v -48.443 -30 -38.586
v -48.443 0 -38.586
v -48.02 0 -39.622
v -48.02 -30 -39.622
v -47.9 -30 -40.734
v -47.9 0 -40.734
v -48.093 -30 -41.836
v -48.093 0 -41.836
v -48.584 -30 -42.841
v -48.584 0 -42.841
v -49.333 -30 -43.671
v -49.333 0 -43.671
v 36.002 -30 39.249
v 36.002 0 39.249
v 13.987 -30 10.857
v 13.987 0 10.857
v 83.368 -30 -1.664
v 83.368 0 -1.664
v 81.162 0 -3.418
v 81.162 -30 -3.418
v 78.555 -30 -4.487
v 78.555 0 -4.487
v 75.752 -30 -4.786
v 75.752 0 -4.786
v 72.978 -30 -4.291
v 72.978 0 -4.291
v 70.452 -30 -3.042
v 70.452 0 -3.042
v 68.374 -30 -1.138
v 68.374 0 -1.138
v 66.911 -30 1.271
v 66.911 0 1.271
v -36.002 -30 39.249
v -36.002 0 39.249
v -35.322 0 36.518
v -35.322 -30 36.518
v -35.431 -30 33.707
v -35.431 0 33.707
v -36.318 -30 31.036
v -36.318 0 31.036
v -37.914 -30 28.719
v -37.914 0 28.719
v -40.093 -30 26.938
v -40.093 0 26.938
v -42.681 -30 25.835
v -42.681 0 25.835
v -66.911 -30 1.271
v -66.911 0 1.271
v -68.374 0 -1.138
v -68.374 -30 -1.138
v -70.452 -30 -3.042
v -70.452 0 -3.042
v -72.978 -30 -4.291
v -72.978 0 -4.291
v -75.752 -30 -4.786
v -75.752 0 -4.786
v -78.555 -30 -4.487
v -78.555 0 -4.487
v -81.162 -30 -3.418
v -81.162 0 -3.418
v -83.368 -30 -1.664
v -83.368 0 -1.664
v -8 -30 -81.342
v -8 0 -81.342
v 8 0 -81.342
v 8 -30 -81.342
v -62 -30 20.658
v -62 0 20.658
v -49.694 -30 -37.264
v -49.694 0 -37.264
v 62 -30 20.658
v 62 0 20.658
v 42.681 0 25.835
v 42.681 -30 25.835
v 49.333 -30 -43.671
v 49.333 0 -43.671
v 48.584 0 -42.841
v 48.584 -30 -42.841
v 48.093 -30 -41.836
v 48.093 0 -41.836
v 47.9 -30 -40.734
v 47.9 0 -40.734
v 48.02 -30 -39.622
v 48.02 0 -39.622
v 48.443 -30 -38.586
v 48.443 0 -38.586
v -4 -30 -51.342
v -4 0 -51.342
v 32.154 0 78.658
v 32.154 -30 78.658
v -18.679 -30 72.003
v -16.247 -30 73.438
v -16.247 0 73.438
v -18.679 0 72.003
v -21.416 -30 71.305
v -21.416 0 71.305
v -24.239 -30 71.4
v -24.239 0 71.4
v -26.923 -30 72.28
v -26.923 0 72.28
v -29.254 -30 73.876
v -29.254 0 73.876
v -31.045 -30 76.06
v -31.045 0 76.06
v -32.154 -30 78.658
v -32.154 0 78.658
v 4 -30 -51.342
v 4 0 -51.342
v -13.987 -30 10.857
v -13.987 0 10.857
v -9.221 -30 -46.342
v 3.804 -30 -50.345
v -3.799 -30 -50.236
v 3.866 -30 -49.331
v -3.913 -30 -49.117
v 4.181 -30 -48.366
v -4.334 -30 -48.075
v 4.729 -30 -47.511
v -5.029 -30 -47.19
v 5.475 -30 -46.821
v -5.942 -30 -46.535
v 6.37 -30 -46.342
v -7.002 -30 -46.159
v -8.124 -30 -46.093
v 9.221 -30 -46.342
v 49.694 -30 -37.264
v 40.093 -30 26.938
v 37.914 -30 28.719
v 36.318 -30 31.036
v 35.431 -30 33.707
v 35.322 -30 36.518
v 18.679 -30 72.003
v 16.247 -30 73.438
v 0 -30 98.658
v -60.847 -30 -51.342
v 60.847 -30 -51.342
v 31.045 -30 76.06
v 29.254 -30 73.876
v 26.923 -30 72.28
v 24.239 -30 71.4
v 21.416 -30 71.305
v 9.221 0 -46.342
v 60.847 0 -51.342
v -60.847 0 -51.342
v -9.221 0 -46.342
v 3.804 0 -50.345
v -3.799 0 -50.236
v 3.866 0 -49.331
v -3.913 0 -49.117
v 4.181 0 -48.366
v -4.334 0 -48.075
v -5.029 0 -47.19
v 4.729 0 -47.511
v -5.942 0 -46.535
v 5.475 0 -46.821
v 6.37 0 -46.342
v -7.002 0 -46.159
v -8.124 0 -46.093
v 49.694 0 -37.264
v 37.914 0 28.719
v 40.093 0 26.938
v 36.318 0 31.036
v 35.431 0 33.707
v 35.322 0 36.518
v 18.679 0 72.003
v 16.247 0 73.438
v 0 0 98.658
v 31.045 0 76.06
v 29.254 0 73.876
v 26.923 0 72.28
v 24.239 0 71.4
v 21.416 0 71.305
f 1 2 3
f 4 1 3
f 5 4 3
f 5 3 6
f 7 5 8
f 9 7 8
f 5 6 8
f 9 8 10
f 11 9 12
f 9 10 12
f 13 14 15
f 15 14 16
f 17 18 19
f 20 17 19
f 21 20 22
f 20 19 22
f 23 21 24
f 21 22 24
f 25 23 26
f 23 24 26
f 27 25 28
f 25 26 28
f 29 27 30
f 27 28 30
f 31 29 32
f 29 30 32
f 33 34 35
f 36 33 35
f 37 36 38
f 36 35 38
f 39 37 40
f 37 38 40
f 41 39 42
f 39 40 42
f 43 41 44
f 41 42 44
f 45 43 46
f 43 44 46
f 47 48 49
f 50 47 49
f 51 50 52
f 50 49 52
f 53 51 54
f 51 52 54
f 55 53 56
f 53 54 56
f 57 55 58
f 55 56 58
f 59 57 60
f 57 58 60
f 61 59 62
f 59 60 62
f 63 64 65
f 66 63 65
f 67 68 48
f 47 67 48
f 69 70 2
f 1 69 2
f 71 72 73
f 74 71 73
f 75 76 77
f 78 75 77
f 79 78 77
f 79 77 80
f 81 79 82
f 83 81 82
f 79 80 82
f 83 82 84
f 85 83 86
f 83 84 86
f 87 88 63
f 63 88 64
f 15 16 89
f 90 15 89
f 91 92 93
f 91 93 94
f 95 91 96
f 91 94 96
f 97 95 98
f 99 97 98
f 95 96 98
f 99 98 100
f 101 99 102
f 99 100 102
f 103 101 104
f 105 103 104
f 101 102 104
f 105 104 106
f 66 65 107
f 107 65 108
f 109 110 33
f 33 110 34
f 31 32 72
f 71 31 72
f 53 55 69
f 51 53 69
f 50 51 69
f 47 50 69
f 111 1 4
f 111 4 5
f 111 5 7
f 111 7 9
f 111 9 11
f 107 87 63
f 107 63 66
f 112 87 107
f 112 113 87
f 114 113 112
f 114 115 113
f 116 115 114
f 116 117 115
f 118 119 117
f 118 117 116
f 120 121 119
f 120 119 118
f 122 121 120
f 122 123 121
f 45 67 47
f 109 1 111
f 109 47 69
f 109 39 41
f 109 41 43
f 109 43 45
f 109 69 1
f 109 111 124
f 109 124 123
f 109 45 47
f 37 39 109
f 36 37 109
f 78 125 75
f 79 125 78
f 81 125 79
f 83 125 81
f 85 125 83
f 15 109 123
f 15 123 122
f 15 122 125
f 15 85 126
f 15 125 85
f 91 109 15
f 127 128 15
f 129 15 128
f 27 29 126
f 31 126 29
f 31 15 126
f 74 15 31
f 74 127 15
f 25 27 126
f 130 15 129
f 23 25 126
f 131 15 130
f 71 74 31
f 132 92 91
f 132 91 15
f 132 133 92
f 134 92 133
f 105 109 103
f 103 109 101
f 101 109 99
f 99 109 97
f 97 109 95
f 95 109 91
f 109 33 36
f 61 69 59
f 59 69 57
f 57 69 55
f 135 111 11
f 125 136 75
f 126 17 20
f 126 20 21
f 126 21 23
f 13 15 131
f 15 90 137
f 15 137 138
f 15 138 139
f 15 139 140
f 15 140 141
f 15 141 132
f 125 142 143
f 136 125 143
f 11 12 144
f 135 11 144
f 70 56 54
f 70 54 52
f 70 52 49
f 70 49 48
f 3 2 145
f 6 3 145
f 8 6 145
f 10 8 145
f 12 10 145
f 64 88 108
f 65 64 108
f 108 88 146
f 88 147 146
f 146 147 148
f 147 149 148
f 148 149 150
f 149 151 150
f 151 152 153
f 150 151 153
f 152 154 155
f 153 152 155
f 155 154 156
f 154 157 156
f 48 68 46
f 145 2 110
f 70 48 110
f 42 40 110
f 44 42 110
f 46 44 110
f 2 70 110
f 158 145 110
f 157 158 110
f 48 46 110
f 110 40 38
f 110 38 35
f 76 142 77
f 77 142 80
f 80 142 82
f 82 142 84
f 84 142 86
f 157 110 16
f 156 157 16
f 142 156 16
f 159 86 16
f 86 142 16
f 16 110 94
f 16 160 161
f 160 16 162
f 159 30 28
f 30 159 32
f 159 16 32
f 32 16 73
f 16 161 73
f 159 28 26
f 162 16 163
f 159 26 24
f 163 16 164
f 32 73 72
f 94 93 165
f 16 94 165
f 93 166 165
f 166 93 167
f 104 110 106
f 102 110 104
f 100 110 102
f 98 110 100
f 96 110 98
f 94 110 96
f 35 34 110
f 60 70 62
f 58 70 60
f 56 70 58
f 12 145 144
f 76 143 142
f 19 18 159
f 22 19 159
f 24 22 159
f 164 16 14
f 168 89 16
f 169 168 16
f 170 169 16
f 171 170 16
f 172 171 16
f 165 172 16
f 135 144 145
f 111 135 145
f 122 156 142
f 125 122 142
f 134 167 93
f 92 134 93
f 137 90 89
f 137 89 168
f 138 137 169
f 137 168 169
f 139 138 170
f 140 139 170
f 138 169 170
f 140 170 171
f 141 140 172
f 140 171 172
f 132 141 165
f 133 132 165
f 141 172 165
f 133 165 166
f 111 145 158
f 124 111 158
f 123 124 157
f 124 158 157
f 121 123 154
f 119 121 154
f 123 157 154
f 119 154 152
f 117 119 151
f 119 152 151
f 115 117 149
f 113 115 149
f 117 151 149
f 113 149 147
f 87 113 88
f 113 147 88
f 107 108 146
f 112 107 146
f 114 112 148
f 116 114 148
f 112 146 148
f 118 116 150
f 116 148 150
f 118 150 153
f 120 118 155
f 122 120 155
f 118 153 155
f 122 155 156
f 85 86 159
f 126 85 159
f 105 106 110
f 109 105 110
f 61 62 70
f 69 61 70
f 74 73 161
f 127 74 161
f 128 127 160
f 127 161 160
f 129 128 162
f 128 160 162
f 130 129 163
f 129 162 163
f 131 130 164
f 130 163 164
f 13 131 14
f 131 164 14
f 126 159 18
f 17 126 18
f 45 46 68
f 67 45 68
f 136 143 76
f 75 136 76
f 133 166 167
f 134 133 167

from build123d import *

# Parameters (mm, degrees)
F1_DEPTH = 30


with BuildPart() as f1:
    # F0 (on Front) → F1 (new body)
    with BuildSketch(Plane.XZ):
        with BuildLine():
            Line((16.246856, 73.438403), (0, 98.65823))
            Line((0, 98.65823), (0, -51.34177))
            Line((0, -51.34177), (4, -51.34177))
            ThreePointArc((4, -51.34177), (4.181132, -48.365772), (6.370376, -46.34177))
            ThreePointArc((6.370376, -46.34177), (7.795537, -46.079272), (9.220697, -46.34177))
            Line((9.220697, -46.34177), (60.847245, -51.34177))
            Line((60.847245, -51.34177), (49.33347, -43.671459))
            ThreePointArc((49.33347, -43.671459), (47.957966, -41.291777), (48.44287, -38.58627))
            ThreePointArc((48.44287, -38.58627), (48.992071, -37.85299), (49.69371, -37.263903))
            Line((49.69371, -37.263903), (83.367956, -1.664075))
            ThreePointArc((83.367956, -1.664075), (74.347655, -4.636921), (66.910868, 1.270518))
            Line((66.910868, 1.270518), (62, 20.65823))
            Line((62, 20.65823), (42.681483, 25.834611))
            ThreePointArc((42.681483, 25.834611), (36.318117, 31.036333), (36.001559, 39.249137))
            Line((36.001559, 39.249137), (13.986726, 10.857402))
            Line((13.986726, 10.857402), (32.153903, 78.65823))
            ThreePointArc((32.153903, 78.65823), (25.612525, 71.744903), (16.246856, 73.438403))
        make_face()
        with BuildLine():
            Line((0, -51.34177), (0, 98.65823))
            Line((0, 98.65823), (-16.246856, 73.438403))
            ThreePointArc((-16.246856, 73.438403), (-25.612525, 71.744903), (-32.153903, 78.65823))
            Line((-32.153903, 78.65823), (-13.986726, 10.857402))
            Line((-13.986726, 10.857402), (-36.001559, 39.249137))
            ThreePointArc((-36.001559, 39.249137), (-36.318117, 31.036333), (-42.681483, 25.834611))
            Line((-42.681483, 25.834611), (-62, 20.65823))
            Line((-62, 20.65823), (-66.910868, 1.270518))
            ThreePointArc((-66.910868, 1.270518), (-74.347655, -4.636921), (-83.367956, -1.664075))
            Line((-83.367956, -1.664075), (-49.69371, -37.263903))
            ThreePointArc((-49.69371, -37.263903), (-48.992071, -37.85299), (-48.44287, -38.58627))
            ThreePointArc((-48.44287, -38.58627), (-47.957966, -41.291777), (-49.33347, -43.671459))
            Line((-49.33347, -43.671459), (-60.847245, -51.34177))
            Line((-60.847245, -51.34177), (-9.220697, -46.34177))
            ThreePointArc((-9.220697, -46.34177), (-5.028829, -47.190444), (-4, -51.34177))
            Line((-4, -51.34177), (-8, -81.34177))
            Line((-8, -81.34177), (0, -81.34177))
            Line((0, -81.34177), (0, -51.34177))
        make_face()
        Polygon((4, -51.34177), (0, -51.34177), (0, -81.34177), (8, -81.34177), align=None)
        with BuildLine():
            ThreePointArc((9.220697, -46.34177), (7.795537, -46.079272), (6.370376, -46.34177))
            Line((6.370376, -46.34177), (9.220697, -46.34177))
        make_face()
        with BuildLine():
            ThreePointArc((49.69371, -37.263903), (48.992071, -37.85299), (48.44287, -38.58627))
            Line((48.44287, -38.58627), (49.69371, -37.263903))
        make_face()
        with BuildLine():
            Line((-49.69371, -37.263903), (-48.44287, -38.58627))
            ThreePointArc((-48.44287, -38.58627), (-48.992071, -37.85299), (-49.69371, -37.263903))
        make_face()
    extrude(amount=F1_DEPTH)


solid = f1.part
